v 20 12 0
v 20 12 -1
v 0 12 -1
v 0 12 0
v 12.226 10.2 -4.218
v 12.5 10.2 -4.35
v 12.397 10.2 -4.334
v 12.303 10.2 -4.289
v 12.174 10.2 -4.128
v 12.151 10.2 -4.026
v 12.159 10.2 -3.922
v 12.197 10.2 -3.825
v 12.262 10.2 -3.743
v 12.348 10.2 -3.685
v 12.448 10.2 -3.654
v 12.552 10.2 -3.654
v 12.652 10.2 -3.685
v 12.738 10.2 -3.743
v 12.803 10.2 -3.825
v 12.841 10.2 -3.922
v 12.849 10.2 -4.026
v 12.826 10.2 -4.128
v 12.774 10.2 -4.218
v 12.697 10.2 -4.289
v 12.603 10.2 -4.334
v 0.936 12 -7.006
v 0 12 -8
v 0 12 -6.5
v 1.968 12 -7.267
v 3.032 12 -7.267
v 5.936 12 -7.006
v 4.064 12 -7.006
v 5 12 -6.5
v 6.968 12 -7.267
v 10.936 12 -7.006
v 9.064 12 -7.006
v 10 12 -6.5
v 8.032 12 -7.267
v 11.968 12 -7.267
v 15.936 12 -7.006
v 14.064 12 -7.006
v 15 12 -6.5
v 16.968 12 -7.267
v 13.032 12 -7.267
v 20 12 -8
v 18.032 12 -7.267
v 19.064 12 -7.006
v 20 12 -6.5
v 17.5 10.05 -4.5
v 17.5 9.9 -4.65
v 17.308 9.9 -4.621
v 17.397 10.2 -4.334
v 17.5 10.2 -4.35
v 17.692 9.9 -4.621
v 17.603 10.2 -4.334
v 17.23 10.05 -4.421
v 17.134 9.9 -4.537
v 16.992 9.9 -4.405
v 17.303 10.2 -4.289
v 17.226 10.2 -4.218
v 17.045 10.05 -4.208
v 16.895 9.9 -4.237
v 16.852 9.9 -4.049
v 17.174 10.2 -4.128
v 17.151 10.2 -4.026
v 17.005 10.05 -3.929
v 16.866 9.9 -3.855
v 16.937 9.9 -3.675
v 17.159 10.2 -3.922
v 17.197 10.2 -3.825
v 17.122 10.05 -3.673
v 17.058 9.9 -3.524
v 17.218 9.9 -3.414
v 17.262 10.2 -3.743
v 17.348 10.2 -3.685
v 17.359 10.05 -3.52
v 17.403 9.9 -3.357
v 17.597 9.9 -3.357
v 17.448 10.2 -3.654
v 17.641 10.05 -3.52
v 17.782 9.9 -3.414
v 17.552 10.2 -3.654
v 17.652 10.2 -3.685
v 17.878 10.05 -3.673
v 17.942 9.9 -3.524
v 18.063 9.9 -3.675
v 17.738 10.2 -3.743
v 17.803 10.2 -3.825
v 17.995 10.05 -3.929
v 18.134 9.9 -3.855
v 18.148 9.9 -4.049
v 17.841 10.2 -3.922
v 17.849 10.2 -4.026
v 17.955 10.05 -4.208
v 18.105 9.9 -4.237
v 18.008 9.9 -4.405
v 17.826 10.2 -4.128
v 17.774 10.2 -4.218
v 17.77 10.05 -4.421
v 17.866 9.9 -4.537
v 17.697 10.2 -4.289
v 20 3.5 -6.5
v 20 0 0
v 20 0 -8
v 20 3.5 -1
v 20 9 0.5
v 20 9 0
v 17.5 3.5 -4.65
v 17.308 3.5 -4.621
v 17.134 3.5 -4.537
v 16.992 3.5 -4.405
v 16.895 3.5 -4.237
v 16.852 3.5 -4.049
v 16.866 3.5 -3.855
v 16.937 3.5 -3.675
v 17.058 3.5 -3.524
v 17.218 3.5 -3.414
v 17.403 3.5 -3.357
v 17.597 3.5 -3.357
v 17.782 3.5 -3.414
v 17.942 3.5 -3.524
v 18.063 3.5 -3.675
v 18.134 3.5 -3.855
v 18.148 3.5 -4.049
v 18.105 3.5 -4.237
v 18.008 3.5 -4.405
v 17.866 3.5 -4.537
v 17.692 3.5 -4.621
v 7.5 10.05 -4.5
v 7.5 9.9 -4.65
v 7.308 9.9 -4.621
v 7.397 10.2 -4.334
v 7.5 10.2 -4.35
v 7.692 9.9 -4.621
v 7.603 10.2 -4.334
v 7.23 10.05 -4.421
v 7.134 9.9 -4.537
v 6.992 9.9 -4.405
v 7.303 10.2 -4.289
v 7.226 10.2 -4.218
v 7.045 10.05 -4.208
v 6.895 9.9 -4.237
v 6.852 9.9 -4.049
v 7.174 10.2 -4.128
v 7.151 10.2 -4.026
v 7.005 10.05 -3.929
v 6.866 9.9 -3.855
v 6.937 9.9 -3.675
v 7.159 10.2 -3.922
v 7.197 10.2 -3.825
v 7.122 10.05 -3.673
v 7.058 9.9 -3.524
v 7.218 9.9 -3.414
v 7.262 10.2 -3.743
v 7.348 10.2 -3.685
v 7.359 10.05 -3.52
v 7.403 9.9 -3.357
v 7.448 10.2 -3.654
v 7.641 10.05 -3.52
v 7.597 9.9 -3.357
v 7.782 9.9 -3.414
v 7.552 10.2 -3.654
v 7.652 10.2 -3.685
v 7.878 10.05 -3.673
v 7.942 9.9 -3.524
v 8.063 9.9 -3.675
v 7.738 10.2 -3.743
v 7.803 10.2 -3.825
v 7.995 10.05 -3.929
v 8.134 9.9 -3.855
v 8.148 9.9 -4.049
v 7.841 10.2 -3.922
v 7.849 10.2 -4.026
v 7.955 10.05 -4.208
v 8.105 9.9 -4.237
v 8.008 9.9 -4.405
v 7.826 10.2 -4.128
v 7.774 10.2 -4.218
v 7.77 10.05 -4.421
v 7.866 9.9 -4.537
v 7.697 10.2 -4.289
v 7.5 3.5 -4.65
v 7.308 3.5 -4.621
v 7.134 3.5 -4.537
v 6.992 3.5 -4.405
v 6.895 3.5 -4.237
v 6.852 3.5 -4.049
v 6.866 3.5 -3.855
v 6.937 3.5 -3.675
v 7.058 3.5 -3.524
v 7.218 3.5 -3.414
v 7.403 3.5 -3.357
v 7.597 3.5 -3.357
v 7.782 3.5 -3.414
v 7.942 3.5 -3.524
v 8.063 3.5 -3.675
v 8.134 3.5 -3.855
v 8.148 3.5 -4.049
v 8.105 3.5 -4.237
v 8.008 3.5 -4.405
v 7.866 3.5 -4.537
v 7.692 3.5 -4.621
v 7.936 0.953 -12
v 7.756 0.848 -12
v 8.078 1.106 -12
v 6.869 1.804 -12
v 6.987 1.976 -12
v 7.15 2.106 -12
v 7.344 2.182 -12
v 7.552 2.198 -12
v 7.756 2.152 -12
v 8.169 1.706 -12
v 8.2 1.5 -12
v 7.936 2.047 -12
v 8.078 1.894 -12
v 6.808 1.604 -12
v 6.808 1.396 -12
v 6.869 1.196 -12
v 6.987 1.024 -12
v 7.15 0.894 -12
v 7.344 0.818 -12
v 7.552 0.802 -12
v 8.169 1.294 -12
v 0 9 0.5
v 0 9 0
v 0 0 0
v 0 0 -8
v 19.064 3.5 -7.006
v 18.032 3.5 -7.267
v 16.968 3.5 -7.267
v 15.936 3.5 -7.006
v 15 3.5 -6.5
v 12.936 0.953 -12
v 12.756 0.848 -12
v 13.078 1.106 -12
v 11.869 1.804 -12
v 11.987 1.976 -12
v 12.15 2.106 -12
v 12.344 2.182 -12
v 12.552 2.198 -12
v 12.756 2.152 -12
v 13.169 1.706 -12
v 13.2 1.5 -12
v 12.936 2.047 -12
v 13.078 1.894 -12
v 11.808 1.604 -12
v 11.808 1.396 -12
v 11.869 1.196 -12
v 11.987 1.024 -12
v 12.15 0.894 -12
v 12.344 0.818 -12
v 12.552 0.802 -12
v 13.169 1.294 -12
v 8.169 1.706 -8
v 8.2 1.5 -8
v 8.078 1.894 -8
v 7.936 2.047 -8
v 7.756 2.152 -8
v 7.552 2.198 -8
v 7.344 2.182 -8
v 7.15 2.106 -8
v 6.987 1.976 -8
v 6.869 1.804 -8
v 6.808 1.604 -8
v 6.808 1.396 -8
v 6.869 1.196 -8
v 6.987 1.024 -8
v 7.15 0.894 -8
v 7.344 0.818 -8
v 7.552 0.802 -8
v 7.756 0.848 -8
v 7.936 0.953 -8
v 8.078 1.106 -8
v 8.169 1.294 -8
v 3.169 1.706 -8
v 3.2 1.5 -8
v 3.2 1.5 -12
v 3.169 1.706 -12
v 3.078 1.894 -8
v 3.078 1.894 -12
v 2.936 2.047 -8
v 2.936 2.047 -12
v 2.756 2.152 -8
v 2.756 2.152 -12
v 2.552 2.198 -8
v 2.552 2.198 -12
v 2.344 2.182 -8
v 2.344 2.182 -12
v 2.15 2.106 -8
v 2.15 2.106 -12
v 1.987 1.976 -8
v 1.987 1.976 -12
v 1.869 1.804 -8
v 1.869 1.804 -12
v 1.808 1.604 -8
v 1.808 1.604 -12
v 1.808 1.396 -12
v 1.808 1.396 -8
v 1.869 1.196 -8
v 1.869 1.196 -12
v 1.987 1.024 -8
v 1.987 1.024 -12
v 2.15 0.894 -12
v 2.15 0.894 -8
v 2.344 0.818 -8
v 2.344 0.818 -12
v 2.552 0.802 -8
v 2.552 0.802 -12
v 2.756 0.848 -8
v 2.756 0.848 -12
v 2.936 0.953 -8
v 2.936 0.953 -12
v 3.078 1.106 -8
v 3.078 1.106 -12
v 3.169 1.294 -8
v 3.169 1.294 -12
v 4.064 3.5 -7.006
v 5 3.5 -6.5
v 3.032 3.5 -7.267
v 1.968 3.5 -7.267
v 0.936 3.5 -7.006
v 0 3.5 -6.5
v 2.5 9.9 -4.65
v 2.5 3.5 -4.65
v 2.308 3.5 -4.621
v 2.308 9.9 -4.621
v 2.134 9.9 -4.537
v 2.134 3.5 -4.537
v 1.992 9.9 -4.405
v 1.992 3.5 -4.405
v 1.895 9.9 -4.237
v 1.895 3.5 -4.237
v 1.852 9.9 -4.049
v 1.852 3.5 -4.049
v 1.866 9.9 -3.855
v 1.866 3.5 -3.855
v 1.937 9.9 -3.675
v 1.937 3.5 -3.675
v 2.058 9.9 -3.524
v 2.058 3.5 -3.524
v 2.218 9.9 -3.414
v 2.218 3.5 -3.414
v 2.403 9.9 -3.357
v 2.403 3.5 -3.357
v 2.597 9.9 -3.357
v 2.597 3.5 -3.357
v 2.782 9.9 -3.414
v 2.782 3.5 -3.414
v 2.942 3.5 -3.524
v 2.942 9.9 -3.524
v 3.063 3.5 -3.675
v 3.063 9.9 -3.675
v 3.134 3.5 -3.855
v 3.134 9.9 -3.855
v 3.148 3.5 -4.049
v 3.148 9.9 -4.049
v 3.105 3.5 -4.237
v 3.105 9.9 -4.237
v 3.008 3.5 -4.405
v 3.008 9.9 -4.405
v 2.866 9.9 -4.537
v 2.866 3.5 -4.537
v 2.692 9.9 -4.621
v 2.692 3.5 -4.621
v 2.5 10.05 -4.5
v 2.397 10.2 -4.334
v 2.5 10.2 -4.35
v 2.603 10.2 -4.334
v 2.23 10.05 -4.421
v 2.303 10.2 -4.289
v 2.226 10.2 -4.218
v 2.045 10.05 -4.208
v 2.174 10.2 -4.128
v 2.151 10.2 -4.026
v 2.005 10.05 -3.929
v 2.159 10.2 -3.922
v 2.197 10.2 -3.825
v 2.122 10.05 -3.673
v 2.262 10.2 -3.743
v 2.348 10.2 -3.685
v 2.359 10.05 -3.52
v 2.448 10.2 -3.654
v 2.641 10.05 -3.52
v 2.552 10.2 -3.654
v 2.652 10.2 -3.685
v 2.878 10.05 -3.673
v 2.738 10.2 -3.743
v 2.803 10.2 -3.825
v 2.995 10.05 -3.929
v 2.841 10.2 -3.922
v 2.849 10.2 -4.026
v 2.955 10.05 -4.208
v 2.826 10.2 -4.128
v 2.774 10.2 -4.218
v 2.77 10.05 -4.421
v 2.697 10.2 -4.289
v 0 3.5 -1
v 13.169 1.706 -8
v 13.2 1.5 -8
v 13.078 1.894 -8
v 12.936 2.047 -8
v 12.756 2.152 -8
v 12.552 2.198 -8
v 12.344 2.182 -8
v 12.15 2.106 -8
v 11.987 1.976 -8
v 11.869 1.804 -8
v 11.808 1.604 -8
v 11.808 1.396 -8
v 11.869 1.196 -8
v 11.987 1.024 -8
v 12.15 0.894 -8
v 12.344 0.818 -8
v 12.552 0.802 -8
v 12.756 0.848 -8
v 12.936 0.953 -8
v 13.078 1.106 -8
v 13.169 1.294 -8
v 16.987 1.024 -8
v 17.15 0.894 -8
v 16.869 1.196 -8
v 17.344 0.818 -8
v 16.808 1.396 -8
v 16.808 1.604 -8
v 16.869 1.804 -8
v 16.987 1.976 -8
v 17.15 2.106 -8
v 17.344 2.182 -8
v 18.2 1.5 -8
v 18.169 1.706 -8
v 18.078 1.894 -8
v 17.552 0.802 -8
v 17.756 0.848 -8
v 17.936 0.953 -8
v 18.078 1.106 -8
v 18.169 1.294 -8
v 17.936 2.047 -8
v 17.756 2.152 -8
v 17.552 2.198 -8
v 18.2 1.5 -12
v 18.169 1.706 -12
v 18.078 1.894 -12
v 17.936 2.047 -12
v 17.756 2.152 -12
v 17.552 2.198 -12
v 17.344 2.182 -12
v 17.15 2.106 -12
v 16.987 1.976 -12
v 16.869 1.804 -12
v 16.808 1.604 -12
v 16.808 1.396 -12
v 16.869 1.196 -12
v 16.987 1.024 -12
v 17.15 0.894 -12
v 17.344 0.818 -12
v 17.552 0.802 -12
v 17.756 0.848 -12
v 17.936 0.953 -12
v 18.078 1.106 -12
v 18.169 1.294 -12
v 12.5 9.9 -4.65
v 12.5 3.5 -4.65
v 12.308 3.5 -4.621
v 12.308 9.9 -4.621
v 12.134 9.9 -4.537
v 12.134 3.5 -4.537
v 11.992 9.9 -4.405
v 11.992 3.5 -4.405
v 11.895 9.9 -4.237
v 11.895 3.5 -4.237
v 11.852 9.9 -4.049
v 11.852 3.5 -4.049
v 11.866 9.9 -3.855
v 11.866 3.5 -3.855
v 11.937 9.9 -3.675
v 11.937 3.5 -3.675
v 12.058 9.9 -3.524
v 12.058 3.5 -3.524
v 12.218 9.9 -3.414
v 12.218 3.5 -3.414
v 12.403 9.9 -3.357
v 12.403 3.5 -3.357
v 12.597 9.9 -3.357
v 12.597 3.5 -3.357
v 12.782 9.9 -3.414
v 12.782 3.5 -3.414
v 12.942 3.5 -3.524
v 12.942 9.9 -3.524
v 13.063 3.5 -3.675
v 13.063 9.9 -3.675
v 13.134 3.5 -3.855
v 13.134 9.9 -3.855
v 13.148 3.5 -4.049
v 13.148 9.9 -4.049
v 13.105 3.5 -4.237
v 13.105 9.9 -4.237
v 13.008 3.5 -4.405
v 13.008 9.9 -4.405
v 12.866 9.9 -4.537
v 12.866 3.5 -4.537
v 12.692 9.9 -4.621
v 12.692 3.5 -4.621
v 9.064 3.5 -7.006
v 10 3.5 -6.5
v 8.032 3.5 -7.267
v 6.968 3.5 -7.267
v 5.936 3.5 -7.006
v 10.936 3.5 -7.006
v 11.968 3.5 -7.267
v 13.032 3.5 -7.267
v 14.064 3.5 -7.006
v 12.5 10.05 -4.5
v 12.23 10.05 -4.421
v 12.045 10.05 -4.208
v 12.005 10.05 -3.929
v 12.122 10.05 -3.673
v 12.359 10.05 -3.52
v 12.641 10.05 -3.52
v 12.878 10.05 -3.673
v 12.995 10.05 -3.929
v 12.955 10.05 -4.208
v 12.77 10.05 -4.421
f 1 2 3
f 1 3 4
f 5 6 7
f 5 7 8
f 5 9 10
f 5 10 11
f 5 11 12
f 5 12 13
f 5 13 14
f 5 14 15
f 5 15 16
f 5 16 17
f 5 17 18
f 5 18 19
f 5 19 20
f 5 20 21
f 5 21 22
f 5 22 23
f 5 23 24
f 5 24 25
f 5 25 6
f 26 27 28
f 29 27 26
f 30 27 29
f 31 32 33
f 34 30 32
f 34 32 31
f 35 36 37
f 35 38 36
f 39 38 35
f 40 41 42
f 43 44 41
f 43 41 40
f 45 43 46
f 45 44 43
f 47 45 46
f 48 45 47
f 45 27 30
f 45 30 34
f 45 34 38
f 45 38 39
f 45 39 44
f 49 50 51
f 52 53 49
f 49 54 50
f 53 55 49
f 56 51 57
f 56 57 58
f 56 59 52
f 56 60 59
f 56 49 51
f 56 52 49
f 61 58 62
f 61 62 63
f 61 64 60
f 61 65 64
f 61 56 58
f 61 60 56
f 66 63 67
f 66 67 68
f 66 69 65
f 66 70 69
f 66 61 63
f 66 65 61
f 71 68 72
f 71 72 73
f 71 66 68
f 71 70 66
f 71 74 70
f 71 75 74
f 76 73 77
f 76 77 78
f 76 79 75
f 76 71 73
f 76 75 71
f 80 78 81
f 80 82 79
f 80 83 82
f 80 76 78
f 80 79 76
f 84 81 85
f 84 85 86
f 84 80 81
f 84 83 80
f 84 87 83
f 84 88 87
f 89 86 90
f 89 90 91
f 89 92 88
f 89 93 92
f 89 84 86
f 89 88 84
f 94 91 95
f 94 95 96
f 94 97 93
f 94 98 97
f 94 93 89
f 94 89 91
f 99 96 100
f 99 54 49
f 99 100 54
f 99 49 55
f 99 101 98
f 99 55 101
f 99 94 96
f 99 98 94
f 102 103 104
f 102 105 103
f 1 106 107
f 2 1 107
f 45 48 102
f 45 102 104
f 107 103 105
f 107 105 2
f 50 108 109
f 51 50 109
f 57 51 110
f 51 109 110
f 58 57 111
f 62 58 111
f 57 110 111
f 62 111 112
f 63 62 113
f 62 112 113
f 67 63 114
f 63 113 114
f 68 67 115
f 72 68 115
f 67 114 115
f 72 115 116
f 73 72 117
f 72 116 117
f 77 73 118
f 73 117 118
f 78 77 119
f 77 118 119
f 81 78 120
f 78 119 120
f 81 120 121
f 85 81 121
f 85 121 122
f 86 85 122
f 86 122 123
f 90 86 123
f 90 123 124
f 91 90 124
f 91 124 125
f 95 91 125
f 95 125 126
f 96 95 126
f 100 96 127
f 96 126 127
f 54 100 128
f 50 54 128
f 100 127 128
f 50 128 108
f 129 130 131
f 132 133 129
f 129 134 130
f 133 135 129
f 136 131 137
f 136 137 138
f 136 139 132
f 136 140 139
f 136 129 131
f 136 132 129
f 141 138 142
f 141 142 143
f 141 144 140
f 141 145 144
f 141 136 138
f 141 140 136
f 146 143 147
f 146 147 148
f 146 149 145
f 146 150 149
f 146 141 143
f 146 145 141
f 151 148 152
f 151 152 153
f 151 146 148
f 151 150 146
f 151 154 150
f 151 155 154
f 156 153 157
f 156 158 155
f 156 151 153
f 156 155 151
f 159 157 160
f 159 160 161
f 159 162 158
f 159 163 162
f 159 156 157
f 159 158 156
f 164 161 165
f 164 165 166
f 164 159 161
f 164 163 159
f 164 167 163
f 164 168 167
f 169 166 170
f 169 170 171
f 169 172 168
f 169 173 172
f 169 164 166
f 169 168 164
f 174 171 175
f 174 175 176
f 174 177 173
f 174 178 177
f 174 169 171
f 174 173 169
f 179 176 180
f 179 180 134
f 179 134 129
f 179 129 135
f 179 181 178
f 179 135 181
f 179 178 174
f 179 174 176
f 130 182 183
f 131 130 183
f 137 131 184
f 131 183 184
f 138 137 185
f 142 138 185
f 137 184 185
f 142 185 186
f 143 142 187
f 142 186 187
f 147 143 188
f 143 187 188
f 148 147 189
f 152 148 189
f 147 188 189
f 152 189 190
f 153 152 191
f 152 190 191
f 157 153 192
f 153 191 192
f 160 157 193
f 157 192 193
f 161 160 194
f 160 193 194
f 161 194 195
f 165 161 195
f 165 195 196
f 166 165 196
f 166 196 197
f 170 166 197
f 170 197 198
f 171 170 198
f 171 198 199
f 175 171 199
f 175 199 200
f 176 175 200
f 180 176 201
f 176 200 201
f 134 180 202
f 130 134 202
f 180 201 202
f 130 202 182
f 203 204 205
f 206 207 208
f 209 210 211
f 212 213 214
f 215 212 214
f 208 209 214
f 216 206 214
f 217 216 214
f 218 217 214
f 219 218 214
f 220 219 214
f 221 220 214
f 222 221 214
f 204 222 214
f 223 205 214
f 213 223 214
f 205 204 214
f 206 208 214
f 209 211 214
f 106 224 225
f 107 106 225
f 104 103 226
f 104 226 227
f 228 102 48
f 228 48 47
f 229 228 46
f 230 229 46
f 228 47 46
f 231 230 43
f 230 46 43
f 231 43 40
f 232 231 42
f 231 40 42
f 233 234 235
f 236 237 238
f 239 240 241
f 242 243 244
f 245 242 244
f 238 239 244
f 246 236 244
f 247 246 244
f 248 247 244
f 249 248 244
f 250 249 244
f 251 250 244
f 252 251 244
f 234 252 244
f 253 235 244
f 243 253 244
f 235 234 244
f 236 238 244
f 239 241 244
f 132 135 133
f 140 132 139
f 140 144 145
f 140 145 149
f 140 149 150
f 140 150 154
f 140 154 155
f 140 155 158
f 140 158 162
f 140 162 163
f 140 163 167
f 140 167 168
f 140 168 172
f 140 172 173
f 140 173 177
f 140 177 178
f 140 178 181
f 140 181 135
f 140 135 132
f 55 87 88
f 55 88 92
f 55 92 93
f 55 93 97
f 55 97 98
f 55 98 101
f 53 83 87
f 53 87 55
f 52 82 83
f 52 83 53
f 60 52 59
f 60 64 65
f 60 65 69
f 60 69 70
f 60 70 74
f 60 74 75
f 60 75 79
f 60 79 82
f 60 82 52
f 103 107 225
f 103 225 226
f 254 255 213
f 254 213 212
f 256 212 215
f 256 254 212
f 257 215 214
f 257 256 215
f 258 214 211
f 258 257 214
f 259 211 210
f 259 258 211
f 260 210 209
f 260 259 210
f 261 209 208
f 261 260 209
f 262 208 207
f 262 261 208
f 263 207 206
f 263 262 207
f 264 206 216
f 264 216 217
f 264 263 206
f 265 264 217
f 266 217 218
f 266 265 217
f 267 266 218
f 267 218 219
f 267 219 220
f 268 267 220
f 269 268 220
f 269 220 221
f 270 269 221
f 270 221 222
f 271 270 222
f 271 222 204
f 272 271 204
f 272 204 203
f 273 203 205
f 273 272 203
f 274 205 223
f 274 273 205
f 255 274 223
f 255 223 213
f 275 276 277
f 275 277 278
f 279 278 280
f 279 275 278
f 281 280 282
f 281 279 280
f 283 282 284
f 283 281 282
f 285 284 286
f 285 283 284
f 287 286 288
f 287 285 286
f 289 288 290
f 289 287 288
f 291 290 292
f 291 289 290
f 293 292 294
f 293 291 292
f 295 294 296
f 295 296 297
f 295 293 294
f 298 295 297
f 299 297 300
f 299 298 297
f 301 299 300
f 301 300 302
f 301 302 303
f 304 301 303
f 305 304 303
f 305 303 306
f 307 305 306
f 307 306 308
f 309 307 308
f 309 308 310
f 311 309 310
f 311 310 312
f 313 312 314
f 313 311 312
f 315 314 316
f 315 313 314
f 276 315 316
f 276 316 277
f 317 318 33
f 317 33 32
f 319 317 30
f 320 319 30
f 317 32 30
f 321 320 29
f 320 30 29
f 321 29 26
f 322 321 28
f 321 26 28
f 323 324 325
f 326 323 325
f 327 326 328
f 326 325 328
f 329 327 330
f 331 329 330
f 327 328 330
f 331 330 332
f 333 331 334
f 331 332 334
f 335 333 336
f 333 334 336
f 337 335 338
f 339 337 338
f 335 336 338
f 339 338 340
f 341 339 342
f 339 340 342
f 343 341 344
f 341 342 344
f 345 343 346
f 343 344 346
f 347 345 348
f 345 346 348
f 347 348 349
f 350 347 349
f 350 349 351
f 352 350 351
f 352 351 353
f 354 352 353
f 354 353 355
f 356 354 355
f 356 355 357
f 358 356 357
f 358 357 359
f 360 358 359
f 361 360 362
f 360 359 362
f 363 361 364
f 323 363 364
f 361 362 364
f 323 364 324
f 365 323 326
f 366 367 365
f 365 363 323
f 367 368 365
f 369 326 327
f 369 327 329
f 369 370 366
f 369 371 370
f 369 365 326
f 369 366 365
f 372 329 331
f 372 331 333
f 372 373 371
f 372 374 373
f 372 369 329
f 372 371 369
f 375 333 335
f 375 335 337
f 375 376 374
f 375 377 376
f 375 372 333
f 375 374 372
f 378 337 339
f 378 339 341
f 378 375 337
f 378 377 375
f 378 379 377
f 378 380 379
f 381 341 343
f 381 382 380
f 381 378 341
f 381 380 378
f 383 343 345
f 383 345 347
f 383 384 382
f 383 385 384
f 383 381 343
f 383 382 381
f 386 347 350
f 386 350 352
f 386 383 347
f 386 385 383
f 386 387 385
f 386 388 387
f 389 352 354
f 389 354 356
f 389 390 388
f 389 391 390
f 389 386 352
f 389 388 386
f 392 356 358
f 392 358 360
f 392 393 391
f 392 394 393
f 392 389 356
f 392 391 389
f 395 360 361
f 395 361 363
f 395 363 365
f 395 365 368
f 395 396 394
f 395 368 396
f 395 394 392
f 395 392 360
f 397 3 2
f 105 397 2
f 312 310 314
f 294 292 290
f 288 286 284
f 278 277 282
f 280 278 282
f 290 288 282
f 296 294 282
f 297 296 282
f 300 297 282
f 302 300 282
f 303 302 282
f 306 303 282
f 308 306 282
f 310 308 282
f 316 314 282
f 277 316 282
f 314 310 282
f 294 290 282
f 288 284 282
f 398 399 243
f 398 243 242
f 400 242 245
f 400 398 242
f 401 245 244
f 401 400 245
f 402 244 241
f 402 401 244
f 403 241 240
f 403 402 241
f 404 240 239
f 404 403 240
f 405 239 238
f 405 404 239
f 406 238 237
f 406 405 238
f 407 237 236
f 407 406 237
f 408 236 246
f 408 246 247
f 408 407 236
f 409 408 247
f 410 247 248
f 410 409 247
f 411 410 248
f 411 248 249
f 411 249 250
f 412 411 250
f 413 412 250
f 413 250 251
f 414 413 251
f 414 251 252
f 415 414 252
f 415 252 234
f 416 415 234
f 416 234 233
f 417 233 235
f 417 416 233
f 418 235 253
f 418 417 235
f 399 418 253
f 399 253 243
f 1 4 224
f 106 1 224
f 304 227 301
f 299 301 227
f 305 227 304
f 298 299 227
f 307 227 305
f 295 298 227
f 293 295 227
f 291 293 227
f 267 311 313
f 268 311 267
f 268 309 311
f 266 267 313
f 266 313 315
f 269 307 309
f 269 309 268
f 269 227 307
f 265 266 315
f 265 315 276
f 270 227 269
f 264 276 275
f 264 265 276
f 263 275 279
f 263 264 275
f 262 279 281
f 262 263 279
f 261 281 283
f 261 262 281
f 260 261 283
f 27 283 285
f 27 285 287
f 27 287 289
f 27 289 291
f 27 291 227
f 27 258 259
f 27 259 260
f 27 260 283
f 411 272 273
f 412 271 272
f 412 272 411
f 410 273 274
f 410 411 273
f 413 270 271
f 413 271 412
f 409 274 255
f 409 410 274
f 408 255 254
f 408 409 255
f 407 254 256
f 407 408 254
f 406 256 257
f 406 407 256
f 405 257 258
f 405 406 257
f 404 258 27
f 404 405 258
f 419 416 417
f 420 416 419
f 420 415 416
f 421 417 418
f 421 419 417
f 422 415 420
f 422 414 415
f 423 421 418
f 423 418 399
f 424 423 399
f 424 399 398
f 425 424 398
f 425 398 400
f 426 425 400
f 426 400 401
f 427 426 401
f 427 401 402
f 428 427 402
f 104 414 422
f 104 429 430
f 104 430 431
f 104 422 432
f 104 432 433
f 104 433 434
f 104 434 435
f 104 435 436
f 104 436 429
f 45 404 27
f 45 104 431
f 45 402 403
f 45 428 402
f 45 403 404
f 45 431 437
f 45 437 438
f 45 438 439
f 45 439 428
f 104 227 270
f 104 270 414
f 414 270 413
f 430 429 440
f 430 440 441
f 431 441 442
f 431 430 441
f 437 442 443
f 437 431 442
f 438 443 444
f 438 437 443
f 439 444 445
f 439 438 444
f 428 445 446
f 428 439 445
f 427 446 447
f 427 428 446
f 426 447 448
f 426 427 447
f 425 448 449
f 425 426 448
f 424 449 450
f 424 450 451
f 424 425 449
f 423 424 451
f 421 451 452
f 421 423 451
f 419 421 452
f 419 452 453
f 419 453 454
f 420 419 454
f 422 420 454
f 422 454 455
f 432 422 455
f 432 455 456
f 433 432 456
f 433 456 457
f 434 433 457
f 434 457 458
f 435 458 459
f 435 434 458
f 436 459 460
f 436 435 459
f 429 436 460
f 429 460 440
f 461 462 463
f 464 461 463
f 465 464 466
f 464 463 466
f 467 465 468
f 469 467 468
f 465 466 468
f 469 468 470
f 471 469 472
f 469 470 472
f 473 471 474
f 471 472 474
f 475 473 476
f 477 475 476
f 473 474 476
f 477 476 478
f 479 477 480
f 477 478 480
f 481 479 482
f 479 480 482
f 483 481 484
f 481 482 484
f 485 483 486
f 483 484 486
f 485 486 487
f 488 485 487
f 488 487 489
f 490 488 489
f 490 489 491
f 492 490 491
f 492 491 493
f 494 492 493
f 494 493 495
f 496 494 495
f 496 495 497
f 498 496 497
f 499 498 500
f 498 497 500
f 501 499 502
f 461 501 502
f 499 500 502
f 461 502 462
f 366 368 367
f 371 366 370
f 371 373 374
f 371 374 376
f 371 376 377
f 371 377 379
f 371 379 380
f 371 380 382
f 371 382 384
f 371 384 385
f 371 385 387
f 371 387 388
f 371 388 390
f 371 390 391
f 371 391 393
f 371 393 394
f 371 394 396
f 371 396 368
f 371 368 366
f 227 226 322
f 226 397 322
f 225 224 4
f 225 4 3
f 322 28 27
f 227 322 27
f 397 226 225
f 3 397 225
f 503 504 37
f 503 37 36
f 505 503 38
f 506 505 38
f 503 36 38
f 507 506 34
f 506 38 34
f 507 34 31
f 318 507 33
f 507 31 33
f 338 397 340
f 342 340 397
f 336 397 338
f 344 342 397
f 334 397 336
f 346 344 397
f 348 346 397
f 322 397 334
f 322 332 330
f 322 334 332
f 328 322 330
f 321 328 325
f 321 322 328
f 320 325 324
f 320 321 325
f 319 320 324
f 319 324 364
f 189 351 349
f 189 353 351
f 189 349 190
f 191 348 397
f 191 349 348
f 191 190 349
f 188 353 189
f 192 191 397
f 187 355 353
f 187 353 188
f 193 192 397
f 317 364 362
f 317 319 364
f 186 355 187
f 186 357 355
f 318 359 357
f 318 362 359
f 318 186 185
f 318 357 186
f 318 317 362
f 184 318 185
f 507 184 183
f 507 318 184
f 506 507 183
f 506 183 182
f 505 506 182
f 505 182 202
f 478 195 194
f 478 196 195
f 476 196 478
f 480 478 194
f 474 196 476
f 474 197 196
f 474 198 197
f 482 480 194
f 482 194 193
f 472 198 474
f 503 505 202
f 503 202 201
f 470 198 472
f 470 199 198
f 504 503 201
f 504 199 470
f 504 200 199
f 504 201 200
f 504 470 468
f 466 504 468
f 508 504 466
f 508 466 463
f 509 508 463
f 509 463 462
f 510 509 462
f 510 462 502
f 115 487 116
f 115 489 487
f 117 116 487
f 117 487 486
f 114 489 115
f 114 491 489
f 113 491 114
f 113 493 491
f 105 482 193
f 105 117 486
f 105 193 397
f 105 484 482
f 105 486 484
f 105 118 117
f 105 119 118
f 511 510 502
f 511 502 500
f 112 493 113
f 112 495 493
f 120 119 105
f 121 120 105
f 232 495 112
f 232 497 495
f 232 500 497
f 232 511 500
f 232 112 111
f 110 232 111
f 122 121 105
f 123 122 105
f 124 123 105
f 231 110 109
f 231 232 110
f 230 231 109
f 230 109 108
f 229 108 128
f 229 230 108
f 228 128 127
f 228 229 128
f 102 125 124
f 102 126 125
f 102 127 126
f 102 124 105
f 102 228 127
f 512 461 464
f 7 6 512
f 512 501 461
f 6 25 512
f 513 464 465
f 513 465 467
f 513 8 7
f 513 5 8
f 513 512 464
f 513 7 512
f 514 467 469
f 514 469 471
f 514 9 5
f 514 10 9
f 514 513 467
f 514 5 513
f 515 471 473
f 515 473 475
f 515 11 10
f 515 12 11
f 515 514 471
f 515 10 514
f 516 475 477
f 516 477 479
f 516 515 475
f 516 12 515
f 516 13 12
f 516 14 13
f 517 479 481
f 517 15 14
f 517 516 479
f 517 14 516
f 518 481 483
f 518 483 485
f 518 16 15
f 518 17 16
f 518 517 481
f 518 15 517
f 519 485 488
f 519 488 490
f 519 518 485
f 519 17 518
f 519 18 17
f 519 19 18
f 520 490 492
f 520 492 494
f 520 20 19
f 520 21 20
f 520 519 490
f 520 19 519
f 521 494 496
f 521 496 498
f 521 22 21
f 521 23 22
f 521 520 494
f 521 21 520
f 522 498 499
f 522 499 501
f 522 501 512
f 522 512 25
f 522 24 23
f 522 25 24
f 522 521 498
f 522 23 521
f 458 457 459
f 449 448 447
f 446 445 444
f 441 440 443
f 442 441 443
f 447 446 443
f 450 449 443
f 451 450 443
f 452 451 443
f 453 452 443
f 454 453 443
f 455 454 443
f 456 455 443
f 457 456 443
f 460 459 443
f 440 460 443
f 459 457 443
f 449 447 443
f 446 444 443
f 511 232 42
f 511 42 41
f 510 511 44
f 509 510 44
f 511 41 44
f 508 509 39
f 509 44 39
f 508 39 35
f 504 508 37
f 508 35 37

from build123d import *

# Parameters (mm, degrees)
EXTRUDE_1_DEPTH                    = 20
SKETCH_5_R                         = 0.7
EXTRUDE_3_DEPTH                    = 4
CUT_EXTRUDE_1_DEPTH                = 8.5
SKETCH_7_R                         = 0.65
EXTRUDE_4_DEPTH                    = 6.7
CHAMFER_1_SIZE                     = 0.3
PATTERN_LINEAR_2_COUNT             = 4
PATTERN_LINEAR_2_PITCH             = 5
PATTERN_LINEAR_3_COUNT             = 4
PATTERN_LINEAR_3_PITCH             = 5
CHAMFER_1_OF_PATTERN_LINEAR_3_SIZE = 0.3
EXTRUDE_5_DEPTH                    = 0.5
EXTRUDE_6_DEPTH                    = 0.5
CUT_EXTRUDE_2_REACH                = 28.613
SKETCH_10_W                        = 0.5
SKETCH_10_H                        = 8.5


with BuildPart() as part:
    # Эскиз1 → Вытянуть1 (new body)
    with BuildSketch(Plane(origin=(0, 0, 0), x_dir=(0, -1, 0), z_dir=(1, 0, 0))):
        Polygon((-9, 0), (-9, -0.5), (-12, 0), (-12, 8), (0, 8), (0, 0), align=None)
    extrude(amount=EXTRUDE_1_DEPTH)

    # Эскиз5 → Вытянуть3 (add)
    with BuildSketch(Plane(origin=(0, 8, -8), x_dir=(1, 0, 0), z_dir=(0, 0, 1))):
        with Locations((2.5, -6.5)):
            Circle(SKETCH_5_R)
    extrude_3 = extrude(amount=-EXTRUDE_3_DEPTH)

    # Эскиз6 → Вырез-Вытянуть1 (cut)
    with BuildSketch(Plane(origin=(0, 12, 0), x_dir=(1, 0, 0), z_dir=(0, 1, 0))):
        with BuildLine():
            Line((0, 6.5), (0, 1))
            Line((0, 1), (5, 1))
            Line((5, 1), (5, 6.5))
            ThreePointArc((5, 6.5), (2.5, 7.3), (0, 6.5))
        make_face()
    cut_extrude_1 = extrude(amount=-CUT_EXTRUDE_1_DEPTH, mode=Mode.SUBTRACT)

    # Эскиз7 → Вытянуть4 (add)
    with BuildSketch(Plane(origin=(0, 3.5, 0), x_dir=(1, 0, 0), z_dir=(0, 1, 0))):
        with Locations(Location((2.5, 4, 0), (0, 0, 90))):
            Circle(SKETCH_7_R)
    extrude_4 = extrude(amount=EXTRUDE_4_DEPTH)

    # Фаска1
    chamfer_1_edges = [part.edges().sort_by_distance(p)[0] for p in [
        (2.5, 10.2, -3.35),
    ]]
    chamfer(chamfer_1_edges, length=CHAMFER_1_SIZE)

    # Линейный массив2: Вытянуть3, Вырез-Вытянуть1 ×4
    with Locations(*[(i * PATTERN_LINEAR_2_PITCH, 0, 0) for i in range(1, PATTERN_LINEAR_2_COUNT)]):
        add(extrude_3)
        add(cut_extrude_1, mode=Mode.SUBTRACT)

    # Линейный массив3: Вытянуть4 ×4
    with Locations(*[(i * PATTERN_LINEAR_3_PITCH, 0, 0) for i in range(1, PATTERN_LINEAR_3_COUNT)]):
        add(extrude_4)

    # Фаска1 of Линейный массив3
    chamfer_1_of_pattern_linear_3_edges = [part.edges().sort_by_distance(p)[0] for p in [
        (7.5, 10.2, -3.35),
        (12.5, 10.2, -3.35),
        (17.5, 10.2, -3.35),
    ]]
    chamfer(chamfer_1_of_pattern_linear_3_edges, length=CHAMFER_1_OF_PATTERN_LINEAR_3_SIZE)

    # Эскиз8 → Вытянуть5 (add)
    with BuildSketch(Plane(origin=(20, 0, 0), x_dir=(0, 0, -1), z_dir=(1, 0, 0))):
        Polygon((0, 12), (8, 12), (8, 0), (0, 0), (0, 9), (-0.5, 9), align=None)
    extrude(amount=EXTRUDE_5_DEPTH)

    # Эскиз9 → Вытянуть6 (add)
    with BuildSketch(Plane.ZY):
        Polygon((-8, 12), (0, 12), (0.5, 9), (0, 9), (0, 0), (-8, 0), align=None)
    extrude(amount=EXTRUDE_6_DEPTH)

    # Эскиз10 → Вырез-Вытянуть2 (cut, up to next)
    with BuildSketch(Plane(origin=(0, 12, 0), x_dir=(1, 0, 0), z_dir=(0, 1, 0)), mode=Mode.PRIVATE) as cut_extrude_2_sk1:
        with Locations((20.25, 3.75)):
            Rectangle(SKETCH_10_W, SKETCH_10_H)
    cut_extrude_2_tool1 = extrude(cut_extrude_2_sk1.sketch, amount=-CUT_EXTRUDE_2_REACH, mode=Mode.PRIVATE) & part.part
    # Эскиз10 → Вырез-Вытянуть2 (cut, up to next)
    with BuildSketch(Plane(origin=(0, 12, 0), x_dir=(1, 0, 0), z_dir=(0, 1, 0)), mode=Mode.PRIVATE) as cut_extrude_2_sk2:
        with Locations((-0.25, 3.75)):
            Rectangle(SKETCH_10_W, SKETCH_10_H)
    cut_extrude_2_tool2 = extrude(cut_extrude_2_sk2.sketch, amount=-CUT_EXTRUDE_2_REACH, mode=Mode.PRIVATE) & part.part
    add(cut_extrude_2_tool1.solids().sort_by_distance((20.25, 12, -3.75))[0], mode=Mode.SUBTRACT)
    add(cut_extrude_2_tool2.solids().sort_by_distance((-0.25, 12, -3.75))[0], mode=Mode.SUBTRACT)


solid = part.part
